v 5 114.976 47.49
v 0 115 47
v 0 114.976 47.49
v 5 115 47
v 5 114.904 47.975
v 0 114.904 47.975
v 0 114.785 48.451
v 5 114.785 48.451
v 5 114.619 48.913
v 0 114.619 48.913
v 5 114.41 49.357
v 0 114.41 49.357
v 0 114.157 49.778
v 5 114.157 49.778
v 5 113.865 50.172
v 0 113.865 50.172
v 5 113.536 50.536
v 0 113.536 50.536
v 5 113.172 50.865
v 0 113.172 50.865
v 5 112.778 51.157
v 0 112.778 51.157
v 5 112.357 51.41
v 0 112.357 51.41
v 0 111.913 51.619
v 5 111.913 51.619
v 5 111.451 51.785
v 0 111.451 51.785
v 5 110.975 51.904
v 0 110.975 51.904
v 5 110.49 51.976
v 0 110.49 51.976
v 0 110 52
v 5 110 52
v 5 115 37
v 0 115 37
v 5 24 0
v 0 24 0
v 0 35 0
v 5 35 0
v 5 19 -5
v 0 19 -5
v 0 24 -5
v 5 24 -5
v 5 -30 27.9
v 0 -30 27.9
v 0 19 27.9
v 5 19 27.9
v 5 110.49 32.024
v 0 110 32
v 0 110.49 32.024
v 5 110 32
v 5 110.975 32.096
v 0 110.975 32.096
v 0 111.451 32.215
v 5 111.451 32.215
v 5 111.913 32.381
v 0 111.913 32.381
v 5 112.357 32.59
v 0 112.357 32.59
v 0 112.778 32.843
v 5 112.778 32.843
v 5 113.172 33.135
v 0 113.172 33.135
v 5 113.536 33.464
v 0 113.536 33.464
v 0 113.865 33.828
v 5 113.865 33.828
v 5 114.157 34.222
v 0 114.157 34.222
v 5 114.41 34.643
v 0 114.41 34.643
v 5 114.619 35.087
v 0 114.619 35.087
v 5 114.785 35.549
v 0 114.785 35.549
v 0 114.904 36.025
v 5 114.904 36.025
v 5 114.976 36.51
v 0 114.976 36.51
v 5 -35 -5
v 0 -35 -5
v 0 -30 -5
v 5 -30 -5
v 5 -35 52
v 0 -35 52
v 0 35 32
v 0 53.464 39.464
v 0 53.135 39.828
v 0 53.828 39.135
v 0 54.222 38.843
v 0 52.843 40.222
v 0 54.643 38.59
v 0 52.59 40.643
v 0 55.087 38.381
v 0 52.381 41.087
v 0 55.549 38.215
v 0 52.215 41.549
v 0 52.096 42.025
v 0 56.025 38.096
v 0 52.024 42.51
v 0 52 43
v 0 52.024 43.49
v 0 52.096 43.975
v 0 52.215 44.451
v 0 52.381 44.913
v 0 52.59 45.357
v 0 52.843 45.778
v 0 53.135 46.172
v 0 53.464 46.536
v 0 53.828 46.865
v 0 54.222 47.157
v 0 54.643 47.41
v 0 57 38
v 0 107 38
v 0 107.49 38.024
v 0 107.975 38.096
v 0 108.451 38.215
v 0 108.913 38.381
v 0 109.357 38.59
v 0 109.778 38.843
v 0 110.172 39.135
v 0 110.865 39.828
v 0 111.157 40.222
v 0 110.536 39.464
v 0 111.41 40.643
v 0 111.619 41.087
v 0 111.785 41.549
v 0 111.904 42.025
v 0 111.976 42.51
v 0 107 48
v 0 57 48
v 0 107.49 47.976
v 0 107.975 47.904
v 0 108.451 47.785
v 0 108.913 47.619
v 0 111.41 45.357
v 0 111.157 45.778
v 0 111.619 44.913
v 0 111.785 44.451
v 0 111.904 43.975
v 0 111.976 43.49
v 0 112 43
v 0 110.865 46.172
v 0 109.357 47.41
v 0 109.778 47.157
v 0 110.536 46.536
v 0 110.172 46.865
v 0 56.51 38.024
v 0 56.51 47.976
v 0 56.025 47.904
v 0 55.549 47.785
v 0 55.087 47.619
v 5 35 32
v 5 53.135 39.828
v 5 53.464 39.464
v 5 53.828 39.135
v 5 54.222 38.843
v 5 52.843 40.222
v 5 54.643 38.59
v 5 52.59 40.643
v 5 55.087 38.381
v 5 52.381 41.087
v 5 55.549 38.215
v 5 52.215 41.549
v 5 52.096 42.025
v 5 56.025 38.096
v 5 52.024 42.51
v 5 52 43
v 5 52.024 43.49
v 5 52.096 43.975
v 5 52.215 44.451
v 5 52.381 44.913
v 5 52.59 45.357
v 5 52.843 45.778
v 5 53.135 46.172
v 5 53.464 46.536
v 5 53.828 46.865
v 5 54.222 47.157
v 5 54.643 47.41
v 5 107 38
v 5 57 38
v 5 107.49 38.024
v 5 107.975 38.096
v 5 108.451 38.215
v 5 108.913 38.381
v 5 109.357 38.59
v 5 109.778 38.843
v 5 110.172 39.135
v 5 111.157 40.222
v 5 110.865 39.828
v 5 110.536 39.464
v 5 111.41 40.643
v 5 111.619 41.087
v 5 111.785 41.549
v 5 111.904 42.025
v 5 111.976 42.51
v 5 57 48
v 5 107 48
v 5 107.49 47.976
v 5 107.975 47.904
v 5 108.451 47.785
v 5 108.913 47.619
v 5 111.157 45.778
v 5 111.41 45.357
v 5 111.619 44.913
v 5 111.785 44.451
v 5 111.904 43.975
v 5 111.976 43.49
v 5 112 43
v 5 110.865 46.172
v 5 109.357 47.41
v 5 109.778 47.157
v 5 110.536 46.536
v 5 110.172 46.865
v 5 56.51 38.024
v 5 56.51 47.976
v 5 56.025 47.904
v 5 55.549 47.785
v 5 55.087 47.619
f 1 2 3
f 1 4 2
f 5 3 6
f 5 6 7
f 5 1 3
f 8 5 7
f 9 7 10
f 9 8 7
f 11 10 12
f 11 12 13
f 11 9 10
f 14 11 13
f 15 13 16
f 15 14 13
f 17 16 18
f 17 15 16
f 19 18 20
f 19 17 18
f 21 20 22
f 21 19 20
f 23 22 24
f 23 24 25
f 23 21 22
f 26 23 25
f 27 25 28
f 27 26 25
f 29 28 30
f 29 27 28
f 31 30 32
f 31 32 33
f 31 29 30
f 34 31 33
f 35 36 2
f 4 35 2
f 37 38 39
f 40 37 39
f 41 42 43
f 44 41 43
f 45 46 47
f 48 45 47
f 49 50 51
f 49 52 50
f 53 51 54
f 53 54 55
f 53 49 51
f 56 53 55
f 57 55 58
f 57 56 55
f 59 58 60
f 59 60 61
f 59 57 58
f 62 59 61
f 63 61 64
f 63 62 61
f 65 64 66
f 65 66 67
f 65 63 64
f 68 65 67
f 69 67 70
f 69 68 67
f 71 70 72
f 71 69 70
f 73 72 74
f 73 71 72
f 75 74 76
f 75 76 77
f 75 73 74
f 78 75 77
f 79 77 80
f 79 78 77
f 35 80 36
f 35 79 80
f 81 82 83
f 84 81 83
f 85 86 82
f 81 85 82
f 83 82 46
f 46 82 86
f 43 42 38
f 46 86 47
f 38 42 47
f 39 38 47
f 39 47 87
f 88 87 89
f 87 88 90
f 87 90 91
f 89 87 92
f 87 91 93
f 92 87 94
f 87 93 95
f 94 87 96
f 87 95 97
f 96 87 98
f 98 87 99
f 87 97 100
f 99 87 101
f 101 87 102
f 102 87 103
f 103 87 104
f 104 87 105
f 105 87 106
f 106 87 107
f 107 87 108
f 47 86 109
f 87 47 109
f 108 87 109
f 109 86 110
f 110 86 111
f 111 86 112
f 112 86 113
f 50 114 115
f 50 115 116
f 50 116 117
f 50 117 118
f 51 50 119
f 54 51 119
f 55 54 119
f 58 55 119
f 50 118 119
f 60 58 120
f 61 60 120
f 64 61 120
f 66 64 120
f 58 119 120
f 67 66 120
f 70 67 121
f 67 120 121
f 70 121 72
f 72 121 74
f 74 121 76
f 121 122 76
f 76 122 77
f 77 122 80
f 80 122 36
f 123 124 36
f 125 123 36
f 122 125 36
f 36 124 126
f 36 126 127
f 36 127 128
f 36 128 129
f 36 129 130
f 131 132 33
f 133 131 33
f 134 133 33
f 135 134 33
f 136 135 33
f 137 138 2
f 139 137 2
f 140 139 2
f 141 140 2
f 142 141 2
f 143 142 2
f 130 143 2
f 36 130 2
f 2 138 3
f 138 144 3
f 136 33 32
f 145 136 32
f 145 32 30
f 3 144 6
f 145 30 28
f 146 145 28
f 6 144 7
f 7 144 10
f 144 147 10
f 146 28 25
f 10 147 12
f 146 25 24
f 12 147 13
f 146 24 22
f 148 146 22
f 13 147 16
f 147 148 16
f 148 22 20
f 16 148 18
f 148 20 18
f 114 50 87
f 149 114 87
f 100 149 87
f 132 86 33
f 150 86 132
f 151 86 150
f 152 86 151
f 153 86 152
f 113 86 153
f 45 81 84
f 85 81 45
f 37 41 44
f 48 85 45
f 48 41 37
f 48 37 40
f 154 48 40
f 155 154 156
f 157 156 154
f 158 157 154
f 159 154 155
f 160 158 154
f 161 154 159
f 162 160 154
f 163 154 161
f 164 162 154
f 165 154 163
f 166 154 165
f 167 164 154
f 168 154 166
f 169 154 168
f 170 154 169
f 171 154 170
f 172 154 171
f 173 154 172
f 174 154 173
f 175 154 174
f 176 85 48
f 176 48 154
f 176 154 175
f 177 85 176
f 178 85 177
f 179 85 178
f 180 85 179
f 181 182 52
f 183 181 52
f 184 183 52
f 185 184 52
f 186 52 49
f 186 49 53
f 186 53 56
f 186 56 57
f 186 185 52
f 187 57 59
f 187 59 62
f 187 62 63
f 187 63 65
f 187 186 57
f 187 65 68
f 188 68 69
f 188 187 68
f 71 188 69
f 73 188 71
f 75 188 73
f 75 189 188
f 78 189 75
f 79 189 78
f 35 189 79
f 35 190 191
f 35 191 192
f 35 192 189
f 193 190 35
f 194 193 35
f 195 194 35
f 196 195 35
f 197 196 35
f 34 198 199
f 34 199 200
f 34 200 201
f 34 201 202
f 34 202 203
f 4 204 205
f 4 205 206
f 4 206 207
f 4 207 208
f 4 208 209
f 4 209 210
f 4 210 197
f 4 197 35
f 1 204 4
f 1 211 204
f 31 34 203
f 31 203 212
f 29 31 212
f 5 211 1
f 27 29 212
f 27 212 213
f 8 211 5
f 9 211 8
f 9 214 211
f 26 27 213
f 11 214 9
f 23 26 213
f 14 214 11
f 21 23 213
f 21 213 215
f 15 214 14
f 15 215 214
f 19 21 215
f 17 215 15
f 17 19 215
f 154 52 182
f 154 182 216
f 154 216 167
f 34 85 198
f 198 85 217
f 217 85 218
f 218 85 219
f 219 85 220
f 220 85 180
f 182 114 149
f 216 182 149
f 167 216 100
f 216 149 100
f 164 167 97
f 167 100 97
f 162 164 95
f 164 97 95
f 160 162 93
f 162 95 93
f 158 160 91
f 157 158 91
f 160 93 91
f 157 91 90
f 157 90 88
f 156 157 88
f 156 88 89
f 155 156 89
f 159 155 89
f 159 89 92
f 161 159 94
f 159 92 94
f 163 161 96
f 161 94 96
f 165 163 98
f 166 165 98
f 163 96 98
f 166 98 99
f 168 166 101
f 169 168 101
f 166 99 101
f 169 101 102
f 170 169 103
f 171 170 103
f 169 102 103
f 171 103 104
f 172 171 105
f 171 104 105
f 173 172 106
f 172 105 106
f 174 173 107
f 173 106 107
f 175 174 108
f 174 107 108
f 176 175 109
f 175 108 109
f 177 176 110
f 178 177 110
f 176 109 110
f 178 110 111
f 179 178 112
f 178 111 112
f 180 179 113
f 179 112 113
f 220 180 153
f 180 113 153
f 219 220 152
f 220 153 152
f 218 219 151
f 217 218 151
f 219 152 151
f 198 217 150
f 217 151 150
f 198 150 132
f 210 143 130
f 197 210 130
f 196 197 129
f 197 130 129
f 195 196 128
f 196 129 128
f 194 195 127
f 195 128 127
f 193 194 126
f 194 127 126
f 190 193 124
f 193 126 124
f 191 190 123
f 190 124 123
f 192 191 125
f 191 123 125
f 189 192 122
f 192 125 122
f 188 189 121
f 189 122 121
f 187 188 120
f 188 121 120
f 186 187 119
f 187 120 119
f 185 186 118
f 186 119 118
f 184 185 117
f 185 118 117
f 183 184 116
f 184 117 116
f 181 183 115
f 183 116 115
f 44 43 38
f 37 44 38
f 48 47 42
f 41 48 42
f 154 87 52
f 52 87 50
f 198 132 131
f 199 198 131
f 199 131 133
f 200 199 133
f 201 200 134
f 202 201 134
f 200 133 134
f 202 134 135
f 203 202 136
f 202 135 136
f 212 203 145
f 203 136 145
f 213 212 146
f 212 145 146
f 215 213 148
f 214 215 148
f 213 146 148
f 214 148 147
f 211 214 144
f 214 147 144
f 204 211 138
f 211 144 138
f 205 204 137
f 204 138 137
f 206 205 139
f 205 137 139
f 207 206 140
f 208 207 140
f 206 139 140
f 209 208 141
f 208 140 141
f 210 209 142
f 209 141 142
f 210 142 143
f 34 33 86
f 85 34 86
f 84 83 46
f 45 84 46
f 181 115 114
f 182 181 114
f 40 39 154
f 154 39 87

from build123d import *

# Parameters (mm, degrees)
F0_W     = 80
F0_H     = 20
F0_W_2   = 5
F0_H_2   = 5
F1_DEPTH = 5
F2_R     = 5


# Not quite as in the source:
# - a feature names something its author has since deleted; it is built from what else it names


with BuildPart() as f1:
    # F0 (on Right) → F1 (new body)
    with BuildSketch(Plane.YZ):
        with Locations((75, 42)):
            Rectangle(F0_W, F0_H)
        with BuildLine():
            ThreePointArc((107, 48), (110.5355339059, 46.5355339059), (112, 43))
            ThreePointArc((112, 43), (110.5355339059, 39.4644660941), (107, 38))
            Line((107, 38), (57, 38))
            ThreePointArc((57, 38), (52, 43), (57, 48))
            Line((57, 48), (107, 48))
        make_face(mode=Mode.SUBTRACT)
        Polygon((35, 52), (-35, 52), (-35, 0), (-30, 0), (-30, 27.9), (19, 27.9), (19, 0), (24, 0), (35, 0), (35, 32), align=None)
        with Locations((21.5, -2.5)):
            Rectangle(F0_W_2, F0_H_2)
        with Locations((-32.5, -2.5)):
            Rectangle(F0_W_2, F0_H_2)
    extrude(amount=F1_DEPTH)

    # F2
    f2_edges = [f1.edges().sort_by_distance(p)[0] for p in [
        (2.5, 115, 52),
        (2.5, 115, 32),
    ]]
    fillet(f2_edges, radius=F2_R)


solid = f1.part
